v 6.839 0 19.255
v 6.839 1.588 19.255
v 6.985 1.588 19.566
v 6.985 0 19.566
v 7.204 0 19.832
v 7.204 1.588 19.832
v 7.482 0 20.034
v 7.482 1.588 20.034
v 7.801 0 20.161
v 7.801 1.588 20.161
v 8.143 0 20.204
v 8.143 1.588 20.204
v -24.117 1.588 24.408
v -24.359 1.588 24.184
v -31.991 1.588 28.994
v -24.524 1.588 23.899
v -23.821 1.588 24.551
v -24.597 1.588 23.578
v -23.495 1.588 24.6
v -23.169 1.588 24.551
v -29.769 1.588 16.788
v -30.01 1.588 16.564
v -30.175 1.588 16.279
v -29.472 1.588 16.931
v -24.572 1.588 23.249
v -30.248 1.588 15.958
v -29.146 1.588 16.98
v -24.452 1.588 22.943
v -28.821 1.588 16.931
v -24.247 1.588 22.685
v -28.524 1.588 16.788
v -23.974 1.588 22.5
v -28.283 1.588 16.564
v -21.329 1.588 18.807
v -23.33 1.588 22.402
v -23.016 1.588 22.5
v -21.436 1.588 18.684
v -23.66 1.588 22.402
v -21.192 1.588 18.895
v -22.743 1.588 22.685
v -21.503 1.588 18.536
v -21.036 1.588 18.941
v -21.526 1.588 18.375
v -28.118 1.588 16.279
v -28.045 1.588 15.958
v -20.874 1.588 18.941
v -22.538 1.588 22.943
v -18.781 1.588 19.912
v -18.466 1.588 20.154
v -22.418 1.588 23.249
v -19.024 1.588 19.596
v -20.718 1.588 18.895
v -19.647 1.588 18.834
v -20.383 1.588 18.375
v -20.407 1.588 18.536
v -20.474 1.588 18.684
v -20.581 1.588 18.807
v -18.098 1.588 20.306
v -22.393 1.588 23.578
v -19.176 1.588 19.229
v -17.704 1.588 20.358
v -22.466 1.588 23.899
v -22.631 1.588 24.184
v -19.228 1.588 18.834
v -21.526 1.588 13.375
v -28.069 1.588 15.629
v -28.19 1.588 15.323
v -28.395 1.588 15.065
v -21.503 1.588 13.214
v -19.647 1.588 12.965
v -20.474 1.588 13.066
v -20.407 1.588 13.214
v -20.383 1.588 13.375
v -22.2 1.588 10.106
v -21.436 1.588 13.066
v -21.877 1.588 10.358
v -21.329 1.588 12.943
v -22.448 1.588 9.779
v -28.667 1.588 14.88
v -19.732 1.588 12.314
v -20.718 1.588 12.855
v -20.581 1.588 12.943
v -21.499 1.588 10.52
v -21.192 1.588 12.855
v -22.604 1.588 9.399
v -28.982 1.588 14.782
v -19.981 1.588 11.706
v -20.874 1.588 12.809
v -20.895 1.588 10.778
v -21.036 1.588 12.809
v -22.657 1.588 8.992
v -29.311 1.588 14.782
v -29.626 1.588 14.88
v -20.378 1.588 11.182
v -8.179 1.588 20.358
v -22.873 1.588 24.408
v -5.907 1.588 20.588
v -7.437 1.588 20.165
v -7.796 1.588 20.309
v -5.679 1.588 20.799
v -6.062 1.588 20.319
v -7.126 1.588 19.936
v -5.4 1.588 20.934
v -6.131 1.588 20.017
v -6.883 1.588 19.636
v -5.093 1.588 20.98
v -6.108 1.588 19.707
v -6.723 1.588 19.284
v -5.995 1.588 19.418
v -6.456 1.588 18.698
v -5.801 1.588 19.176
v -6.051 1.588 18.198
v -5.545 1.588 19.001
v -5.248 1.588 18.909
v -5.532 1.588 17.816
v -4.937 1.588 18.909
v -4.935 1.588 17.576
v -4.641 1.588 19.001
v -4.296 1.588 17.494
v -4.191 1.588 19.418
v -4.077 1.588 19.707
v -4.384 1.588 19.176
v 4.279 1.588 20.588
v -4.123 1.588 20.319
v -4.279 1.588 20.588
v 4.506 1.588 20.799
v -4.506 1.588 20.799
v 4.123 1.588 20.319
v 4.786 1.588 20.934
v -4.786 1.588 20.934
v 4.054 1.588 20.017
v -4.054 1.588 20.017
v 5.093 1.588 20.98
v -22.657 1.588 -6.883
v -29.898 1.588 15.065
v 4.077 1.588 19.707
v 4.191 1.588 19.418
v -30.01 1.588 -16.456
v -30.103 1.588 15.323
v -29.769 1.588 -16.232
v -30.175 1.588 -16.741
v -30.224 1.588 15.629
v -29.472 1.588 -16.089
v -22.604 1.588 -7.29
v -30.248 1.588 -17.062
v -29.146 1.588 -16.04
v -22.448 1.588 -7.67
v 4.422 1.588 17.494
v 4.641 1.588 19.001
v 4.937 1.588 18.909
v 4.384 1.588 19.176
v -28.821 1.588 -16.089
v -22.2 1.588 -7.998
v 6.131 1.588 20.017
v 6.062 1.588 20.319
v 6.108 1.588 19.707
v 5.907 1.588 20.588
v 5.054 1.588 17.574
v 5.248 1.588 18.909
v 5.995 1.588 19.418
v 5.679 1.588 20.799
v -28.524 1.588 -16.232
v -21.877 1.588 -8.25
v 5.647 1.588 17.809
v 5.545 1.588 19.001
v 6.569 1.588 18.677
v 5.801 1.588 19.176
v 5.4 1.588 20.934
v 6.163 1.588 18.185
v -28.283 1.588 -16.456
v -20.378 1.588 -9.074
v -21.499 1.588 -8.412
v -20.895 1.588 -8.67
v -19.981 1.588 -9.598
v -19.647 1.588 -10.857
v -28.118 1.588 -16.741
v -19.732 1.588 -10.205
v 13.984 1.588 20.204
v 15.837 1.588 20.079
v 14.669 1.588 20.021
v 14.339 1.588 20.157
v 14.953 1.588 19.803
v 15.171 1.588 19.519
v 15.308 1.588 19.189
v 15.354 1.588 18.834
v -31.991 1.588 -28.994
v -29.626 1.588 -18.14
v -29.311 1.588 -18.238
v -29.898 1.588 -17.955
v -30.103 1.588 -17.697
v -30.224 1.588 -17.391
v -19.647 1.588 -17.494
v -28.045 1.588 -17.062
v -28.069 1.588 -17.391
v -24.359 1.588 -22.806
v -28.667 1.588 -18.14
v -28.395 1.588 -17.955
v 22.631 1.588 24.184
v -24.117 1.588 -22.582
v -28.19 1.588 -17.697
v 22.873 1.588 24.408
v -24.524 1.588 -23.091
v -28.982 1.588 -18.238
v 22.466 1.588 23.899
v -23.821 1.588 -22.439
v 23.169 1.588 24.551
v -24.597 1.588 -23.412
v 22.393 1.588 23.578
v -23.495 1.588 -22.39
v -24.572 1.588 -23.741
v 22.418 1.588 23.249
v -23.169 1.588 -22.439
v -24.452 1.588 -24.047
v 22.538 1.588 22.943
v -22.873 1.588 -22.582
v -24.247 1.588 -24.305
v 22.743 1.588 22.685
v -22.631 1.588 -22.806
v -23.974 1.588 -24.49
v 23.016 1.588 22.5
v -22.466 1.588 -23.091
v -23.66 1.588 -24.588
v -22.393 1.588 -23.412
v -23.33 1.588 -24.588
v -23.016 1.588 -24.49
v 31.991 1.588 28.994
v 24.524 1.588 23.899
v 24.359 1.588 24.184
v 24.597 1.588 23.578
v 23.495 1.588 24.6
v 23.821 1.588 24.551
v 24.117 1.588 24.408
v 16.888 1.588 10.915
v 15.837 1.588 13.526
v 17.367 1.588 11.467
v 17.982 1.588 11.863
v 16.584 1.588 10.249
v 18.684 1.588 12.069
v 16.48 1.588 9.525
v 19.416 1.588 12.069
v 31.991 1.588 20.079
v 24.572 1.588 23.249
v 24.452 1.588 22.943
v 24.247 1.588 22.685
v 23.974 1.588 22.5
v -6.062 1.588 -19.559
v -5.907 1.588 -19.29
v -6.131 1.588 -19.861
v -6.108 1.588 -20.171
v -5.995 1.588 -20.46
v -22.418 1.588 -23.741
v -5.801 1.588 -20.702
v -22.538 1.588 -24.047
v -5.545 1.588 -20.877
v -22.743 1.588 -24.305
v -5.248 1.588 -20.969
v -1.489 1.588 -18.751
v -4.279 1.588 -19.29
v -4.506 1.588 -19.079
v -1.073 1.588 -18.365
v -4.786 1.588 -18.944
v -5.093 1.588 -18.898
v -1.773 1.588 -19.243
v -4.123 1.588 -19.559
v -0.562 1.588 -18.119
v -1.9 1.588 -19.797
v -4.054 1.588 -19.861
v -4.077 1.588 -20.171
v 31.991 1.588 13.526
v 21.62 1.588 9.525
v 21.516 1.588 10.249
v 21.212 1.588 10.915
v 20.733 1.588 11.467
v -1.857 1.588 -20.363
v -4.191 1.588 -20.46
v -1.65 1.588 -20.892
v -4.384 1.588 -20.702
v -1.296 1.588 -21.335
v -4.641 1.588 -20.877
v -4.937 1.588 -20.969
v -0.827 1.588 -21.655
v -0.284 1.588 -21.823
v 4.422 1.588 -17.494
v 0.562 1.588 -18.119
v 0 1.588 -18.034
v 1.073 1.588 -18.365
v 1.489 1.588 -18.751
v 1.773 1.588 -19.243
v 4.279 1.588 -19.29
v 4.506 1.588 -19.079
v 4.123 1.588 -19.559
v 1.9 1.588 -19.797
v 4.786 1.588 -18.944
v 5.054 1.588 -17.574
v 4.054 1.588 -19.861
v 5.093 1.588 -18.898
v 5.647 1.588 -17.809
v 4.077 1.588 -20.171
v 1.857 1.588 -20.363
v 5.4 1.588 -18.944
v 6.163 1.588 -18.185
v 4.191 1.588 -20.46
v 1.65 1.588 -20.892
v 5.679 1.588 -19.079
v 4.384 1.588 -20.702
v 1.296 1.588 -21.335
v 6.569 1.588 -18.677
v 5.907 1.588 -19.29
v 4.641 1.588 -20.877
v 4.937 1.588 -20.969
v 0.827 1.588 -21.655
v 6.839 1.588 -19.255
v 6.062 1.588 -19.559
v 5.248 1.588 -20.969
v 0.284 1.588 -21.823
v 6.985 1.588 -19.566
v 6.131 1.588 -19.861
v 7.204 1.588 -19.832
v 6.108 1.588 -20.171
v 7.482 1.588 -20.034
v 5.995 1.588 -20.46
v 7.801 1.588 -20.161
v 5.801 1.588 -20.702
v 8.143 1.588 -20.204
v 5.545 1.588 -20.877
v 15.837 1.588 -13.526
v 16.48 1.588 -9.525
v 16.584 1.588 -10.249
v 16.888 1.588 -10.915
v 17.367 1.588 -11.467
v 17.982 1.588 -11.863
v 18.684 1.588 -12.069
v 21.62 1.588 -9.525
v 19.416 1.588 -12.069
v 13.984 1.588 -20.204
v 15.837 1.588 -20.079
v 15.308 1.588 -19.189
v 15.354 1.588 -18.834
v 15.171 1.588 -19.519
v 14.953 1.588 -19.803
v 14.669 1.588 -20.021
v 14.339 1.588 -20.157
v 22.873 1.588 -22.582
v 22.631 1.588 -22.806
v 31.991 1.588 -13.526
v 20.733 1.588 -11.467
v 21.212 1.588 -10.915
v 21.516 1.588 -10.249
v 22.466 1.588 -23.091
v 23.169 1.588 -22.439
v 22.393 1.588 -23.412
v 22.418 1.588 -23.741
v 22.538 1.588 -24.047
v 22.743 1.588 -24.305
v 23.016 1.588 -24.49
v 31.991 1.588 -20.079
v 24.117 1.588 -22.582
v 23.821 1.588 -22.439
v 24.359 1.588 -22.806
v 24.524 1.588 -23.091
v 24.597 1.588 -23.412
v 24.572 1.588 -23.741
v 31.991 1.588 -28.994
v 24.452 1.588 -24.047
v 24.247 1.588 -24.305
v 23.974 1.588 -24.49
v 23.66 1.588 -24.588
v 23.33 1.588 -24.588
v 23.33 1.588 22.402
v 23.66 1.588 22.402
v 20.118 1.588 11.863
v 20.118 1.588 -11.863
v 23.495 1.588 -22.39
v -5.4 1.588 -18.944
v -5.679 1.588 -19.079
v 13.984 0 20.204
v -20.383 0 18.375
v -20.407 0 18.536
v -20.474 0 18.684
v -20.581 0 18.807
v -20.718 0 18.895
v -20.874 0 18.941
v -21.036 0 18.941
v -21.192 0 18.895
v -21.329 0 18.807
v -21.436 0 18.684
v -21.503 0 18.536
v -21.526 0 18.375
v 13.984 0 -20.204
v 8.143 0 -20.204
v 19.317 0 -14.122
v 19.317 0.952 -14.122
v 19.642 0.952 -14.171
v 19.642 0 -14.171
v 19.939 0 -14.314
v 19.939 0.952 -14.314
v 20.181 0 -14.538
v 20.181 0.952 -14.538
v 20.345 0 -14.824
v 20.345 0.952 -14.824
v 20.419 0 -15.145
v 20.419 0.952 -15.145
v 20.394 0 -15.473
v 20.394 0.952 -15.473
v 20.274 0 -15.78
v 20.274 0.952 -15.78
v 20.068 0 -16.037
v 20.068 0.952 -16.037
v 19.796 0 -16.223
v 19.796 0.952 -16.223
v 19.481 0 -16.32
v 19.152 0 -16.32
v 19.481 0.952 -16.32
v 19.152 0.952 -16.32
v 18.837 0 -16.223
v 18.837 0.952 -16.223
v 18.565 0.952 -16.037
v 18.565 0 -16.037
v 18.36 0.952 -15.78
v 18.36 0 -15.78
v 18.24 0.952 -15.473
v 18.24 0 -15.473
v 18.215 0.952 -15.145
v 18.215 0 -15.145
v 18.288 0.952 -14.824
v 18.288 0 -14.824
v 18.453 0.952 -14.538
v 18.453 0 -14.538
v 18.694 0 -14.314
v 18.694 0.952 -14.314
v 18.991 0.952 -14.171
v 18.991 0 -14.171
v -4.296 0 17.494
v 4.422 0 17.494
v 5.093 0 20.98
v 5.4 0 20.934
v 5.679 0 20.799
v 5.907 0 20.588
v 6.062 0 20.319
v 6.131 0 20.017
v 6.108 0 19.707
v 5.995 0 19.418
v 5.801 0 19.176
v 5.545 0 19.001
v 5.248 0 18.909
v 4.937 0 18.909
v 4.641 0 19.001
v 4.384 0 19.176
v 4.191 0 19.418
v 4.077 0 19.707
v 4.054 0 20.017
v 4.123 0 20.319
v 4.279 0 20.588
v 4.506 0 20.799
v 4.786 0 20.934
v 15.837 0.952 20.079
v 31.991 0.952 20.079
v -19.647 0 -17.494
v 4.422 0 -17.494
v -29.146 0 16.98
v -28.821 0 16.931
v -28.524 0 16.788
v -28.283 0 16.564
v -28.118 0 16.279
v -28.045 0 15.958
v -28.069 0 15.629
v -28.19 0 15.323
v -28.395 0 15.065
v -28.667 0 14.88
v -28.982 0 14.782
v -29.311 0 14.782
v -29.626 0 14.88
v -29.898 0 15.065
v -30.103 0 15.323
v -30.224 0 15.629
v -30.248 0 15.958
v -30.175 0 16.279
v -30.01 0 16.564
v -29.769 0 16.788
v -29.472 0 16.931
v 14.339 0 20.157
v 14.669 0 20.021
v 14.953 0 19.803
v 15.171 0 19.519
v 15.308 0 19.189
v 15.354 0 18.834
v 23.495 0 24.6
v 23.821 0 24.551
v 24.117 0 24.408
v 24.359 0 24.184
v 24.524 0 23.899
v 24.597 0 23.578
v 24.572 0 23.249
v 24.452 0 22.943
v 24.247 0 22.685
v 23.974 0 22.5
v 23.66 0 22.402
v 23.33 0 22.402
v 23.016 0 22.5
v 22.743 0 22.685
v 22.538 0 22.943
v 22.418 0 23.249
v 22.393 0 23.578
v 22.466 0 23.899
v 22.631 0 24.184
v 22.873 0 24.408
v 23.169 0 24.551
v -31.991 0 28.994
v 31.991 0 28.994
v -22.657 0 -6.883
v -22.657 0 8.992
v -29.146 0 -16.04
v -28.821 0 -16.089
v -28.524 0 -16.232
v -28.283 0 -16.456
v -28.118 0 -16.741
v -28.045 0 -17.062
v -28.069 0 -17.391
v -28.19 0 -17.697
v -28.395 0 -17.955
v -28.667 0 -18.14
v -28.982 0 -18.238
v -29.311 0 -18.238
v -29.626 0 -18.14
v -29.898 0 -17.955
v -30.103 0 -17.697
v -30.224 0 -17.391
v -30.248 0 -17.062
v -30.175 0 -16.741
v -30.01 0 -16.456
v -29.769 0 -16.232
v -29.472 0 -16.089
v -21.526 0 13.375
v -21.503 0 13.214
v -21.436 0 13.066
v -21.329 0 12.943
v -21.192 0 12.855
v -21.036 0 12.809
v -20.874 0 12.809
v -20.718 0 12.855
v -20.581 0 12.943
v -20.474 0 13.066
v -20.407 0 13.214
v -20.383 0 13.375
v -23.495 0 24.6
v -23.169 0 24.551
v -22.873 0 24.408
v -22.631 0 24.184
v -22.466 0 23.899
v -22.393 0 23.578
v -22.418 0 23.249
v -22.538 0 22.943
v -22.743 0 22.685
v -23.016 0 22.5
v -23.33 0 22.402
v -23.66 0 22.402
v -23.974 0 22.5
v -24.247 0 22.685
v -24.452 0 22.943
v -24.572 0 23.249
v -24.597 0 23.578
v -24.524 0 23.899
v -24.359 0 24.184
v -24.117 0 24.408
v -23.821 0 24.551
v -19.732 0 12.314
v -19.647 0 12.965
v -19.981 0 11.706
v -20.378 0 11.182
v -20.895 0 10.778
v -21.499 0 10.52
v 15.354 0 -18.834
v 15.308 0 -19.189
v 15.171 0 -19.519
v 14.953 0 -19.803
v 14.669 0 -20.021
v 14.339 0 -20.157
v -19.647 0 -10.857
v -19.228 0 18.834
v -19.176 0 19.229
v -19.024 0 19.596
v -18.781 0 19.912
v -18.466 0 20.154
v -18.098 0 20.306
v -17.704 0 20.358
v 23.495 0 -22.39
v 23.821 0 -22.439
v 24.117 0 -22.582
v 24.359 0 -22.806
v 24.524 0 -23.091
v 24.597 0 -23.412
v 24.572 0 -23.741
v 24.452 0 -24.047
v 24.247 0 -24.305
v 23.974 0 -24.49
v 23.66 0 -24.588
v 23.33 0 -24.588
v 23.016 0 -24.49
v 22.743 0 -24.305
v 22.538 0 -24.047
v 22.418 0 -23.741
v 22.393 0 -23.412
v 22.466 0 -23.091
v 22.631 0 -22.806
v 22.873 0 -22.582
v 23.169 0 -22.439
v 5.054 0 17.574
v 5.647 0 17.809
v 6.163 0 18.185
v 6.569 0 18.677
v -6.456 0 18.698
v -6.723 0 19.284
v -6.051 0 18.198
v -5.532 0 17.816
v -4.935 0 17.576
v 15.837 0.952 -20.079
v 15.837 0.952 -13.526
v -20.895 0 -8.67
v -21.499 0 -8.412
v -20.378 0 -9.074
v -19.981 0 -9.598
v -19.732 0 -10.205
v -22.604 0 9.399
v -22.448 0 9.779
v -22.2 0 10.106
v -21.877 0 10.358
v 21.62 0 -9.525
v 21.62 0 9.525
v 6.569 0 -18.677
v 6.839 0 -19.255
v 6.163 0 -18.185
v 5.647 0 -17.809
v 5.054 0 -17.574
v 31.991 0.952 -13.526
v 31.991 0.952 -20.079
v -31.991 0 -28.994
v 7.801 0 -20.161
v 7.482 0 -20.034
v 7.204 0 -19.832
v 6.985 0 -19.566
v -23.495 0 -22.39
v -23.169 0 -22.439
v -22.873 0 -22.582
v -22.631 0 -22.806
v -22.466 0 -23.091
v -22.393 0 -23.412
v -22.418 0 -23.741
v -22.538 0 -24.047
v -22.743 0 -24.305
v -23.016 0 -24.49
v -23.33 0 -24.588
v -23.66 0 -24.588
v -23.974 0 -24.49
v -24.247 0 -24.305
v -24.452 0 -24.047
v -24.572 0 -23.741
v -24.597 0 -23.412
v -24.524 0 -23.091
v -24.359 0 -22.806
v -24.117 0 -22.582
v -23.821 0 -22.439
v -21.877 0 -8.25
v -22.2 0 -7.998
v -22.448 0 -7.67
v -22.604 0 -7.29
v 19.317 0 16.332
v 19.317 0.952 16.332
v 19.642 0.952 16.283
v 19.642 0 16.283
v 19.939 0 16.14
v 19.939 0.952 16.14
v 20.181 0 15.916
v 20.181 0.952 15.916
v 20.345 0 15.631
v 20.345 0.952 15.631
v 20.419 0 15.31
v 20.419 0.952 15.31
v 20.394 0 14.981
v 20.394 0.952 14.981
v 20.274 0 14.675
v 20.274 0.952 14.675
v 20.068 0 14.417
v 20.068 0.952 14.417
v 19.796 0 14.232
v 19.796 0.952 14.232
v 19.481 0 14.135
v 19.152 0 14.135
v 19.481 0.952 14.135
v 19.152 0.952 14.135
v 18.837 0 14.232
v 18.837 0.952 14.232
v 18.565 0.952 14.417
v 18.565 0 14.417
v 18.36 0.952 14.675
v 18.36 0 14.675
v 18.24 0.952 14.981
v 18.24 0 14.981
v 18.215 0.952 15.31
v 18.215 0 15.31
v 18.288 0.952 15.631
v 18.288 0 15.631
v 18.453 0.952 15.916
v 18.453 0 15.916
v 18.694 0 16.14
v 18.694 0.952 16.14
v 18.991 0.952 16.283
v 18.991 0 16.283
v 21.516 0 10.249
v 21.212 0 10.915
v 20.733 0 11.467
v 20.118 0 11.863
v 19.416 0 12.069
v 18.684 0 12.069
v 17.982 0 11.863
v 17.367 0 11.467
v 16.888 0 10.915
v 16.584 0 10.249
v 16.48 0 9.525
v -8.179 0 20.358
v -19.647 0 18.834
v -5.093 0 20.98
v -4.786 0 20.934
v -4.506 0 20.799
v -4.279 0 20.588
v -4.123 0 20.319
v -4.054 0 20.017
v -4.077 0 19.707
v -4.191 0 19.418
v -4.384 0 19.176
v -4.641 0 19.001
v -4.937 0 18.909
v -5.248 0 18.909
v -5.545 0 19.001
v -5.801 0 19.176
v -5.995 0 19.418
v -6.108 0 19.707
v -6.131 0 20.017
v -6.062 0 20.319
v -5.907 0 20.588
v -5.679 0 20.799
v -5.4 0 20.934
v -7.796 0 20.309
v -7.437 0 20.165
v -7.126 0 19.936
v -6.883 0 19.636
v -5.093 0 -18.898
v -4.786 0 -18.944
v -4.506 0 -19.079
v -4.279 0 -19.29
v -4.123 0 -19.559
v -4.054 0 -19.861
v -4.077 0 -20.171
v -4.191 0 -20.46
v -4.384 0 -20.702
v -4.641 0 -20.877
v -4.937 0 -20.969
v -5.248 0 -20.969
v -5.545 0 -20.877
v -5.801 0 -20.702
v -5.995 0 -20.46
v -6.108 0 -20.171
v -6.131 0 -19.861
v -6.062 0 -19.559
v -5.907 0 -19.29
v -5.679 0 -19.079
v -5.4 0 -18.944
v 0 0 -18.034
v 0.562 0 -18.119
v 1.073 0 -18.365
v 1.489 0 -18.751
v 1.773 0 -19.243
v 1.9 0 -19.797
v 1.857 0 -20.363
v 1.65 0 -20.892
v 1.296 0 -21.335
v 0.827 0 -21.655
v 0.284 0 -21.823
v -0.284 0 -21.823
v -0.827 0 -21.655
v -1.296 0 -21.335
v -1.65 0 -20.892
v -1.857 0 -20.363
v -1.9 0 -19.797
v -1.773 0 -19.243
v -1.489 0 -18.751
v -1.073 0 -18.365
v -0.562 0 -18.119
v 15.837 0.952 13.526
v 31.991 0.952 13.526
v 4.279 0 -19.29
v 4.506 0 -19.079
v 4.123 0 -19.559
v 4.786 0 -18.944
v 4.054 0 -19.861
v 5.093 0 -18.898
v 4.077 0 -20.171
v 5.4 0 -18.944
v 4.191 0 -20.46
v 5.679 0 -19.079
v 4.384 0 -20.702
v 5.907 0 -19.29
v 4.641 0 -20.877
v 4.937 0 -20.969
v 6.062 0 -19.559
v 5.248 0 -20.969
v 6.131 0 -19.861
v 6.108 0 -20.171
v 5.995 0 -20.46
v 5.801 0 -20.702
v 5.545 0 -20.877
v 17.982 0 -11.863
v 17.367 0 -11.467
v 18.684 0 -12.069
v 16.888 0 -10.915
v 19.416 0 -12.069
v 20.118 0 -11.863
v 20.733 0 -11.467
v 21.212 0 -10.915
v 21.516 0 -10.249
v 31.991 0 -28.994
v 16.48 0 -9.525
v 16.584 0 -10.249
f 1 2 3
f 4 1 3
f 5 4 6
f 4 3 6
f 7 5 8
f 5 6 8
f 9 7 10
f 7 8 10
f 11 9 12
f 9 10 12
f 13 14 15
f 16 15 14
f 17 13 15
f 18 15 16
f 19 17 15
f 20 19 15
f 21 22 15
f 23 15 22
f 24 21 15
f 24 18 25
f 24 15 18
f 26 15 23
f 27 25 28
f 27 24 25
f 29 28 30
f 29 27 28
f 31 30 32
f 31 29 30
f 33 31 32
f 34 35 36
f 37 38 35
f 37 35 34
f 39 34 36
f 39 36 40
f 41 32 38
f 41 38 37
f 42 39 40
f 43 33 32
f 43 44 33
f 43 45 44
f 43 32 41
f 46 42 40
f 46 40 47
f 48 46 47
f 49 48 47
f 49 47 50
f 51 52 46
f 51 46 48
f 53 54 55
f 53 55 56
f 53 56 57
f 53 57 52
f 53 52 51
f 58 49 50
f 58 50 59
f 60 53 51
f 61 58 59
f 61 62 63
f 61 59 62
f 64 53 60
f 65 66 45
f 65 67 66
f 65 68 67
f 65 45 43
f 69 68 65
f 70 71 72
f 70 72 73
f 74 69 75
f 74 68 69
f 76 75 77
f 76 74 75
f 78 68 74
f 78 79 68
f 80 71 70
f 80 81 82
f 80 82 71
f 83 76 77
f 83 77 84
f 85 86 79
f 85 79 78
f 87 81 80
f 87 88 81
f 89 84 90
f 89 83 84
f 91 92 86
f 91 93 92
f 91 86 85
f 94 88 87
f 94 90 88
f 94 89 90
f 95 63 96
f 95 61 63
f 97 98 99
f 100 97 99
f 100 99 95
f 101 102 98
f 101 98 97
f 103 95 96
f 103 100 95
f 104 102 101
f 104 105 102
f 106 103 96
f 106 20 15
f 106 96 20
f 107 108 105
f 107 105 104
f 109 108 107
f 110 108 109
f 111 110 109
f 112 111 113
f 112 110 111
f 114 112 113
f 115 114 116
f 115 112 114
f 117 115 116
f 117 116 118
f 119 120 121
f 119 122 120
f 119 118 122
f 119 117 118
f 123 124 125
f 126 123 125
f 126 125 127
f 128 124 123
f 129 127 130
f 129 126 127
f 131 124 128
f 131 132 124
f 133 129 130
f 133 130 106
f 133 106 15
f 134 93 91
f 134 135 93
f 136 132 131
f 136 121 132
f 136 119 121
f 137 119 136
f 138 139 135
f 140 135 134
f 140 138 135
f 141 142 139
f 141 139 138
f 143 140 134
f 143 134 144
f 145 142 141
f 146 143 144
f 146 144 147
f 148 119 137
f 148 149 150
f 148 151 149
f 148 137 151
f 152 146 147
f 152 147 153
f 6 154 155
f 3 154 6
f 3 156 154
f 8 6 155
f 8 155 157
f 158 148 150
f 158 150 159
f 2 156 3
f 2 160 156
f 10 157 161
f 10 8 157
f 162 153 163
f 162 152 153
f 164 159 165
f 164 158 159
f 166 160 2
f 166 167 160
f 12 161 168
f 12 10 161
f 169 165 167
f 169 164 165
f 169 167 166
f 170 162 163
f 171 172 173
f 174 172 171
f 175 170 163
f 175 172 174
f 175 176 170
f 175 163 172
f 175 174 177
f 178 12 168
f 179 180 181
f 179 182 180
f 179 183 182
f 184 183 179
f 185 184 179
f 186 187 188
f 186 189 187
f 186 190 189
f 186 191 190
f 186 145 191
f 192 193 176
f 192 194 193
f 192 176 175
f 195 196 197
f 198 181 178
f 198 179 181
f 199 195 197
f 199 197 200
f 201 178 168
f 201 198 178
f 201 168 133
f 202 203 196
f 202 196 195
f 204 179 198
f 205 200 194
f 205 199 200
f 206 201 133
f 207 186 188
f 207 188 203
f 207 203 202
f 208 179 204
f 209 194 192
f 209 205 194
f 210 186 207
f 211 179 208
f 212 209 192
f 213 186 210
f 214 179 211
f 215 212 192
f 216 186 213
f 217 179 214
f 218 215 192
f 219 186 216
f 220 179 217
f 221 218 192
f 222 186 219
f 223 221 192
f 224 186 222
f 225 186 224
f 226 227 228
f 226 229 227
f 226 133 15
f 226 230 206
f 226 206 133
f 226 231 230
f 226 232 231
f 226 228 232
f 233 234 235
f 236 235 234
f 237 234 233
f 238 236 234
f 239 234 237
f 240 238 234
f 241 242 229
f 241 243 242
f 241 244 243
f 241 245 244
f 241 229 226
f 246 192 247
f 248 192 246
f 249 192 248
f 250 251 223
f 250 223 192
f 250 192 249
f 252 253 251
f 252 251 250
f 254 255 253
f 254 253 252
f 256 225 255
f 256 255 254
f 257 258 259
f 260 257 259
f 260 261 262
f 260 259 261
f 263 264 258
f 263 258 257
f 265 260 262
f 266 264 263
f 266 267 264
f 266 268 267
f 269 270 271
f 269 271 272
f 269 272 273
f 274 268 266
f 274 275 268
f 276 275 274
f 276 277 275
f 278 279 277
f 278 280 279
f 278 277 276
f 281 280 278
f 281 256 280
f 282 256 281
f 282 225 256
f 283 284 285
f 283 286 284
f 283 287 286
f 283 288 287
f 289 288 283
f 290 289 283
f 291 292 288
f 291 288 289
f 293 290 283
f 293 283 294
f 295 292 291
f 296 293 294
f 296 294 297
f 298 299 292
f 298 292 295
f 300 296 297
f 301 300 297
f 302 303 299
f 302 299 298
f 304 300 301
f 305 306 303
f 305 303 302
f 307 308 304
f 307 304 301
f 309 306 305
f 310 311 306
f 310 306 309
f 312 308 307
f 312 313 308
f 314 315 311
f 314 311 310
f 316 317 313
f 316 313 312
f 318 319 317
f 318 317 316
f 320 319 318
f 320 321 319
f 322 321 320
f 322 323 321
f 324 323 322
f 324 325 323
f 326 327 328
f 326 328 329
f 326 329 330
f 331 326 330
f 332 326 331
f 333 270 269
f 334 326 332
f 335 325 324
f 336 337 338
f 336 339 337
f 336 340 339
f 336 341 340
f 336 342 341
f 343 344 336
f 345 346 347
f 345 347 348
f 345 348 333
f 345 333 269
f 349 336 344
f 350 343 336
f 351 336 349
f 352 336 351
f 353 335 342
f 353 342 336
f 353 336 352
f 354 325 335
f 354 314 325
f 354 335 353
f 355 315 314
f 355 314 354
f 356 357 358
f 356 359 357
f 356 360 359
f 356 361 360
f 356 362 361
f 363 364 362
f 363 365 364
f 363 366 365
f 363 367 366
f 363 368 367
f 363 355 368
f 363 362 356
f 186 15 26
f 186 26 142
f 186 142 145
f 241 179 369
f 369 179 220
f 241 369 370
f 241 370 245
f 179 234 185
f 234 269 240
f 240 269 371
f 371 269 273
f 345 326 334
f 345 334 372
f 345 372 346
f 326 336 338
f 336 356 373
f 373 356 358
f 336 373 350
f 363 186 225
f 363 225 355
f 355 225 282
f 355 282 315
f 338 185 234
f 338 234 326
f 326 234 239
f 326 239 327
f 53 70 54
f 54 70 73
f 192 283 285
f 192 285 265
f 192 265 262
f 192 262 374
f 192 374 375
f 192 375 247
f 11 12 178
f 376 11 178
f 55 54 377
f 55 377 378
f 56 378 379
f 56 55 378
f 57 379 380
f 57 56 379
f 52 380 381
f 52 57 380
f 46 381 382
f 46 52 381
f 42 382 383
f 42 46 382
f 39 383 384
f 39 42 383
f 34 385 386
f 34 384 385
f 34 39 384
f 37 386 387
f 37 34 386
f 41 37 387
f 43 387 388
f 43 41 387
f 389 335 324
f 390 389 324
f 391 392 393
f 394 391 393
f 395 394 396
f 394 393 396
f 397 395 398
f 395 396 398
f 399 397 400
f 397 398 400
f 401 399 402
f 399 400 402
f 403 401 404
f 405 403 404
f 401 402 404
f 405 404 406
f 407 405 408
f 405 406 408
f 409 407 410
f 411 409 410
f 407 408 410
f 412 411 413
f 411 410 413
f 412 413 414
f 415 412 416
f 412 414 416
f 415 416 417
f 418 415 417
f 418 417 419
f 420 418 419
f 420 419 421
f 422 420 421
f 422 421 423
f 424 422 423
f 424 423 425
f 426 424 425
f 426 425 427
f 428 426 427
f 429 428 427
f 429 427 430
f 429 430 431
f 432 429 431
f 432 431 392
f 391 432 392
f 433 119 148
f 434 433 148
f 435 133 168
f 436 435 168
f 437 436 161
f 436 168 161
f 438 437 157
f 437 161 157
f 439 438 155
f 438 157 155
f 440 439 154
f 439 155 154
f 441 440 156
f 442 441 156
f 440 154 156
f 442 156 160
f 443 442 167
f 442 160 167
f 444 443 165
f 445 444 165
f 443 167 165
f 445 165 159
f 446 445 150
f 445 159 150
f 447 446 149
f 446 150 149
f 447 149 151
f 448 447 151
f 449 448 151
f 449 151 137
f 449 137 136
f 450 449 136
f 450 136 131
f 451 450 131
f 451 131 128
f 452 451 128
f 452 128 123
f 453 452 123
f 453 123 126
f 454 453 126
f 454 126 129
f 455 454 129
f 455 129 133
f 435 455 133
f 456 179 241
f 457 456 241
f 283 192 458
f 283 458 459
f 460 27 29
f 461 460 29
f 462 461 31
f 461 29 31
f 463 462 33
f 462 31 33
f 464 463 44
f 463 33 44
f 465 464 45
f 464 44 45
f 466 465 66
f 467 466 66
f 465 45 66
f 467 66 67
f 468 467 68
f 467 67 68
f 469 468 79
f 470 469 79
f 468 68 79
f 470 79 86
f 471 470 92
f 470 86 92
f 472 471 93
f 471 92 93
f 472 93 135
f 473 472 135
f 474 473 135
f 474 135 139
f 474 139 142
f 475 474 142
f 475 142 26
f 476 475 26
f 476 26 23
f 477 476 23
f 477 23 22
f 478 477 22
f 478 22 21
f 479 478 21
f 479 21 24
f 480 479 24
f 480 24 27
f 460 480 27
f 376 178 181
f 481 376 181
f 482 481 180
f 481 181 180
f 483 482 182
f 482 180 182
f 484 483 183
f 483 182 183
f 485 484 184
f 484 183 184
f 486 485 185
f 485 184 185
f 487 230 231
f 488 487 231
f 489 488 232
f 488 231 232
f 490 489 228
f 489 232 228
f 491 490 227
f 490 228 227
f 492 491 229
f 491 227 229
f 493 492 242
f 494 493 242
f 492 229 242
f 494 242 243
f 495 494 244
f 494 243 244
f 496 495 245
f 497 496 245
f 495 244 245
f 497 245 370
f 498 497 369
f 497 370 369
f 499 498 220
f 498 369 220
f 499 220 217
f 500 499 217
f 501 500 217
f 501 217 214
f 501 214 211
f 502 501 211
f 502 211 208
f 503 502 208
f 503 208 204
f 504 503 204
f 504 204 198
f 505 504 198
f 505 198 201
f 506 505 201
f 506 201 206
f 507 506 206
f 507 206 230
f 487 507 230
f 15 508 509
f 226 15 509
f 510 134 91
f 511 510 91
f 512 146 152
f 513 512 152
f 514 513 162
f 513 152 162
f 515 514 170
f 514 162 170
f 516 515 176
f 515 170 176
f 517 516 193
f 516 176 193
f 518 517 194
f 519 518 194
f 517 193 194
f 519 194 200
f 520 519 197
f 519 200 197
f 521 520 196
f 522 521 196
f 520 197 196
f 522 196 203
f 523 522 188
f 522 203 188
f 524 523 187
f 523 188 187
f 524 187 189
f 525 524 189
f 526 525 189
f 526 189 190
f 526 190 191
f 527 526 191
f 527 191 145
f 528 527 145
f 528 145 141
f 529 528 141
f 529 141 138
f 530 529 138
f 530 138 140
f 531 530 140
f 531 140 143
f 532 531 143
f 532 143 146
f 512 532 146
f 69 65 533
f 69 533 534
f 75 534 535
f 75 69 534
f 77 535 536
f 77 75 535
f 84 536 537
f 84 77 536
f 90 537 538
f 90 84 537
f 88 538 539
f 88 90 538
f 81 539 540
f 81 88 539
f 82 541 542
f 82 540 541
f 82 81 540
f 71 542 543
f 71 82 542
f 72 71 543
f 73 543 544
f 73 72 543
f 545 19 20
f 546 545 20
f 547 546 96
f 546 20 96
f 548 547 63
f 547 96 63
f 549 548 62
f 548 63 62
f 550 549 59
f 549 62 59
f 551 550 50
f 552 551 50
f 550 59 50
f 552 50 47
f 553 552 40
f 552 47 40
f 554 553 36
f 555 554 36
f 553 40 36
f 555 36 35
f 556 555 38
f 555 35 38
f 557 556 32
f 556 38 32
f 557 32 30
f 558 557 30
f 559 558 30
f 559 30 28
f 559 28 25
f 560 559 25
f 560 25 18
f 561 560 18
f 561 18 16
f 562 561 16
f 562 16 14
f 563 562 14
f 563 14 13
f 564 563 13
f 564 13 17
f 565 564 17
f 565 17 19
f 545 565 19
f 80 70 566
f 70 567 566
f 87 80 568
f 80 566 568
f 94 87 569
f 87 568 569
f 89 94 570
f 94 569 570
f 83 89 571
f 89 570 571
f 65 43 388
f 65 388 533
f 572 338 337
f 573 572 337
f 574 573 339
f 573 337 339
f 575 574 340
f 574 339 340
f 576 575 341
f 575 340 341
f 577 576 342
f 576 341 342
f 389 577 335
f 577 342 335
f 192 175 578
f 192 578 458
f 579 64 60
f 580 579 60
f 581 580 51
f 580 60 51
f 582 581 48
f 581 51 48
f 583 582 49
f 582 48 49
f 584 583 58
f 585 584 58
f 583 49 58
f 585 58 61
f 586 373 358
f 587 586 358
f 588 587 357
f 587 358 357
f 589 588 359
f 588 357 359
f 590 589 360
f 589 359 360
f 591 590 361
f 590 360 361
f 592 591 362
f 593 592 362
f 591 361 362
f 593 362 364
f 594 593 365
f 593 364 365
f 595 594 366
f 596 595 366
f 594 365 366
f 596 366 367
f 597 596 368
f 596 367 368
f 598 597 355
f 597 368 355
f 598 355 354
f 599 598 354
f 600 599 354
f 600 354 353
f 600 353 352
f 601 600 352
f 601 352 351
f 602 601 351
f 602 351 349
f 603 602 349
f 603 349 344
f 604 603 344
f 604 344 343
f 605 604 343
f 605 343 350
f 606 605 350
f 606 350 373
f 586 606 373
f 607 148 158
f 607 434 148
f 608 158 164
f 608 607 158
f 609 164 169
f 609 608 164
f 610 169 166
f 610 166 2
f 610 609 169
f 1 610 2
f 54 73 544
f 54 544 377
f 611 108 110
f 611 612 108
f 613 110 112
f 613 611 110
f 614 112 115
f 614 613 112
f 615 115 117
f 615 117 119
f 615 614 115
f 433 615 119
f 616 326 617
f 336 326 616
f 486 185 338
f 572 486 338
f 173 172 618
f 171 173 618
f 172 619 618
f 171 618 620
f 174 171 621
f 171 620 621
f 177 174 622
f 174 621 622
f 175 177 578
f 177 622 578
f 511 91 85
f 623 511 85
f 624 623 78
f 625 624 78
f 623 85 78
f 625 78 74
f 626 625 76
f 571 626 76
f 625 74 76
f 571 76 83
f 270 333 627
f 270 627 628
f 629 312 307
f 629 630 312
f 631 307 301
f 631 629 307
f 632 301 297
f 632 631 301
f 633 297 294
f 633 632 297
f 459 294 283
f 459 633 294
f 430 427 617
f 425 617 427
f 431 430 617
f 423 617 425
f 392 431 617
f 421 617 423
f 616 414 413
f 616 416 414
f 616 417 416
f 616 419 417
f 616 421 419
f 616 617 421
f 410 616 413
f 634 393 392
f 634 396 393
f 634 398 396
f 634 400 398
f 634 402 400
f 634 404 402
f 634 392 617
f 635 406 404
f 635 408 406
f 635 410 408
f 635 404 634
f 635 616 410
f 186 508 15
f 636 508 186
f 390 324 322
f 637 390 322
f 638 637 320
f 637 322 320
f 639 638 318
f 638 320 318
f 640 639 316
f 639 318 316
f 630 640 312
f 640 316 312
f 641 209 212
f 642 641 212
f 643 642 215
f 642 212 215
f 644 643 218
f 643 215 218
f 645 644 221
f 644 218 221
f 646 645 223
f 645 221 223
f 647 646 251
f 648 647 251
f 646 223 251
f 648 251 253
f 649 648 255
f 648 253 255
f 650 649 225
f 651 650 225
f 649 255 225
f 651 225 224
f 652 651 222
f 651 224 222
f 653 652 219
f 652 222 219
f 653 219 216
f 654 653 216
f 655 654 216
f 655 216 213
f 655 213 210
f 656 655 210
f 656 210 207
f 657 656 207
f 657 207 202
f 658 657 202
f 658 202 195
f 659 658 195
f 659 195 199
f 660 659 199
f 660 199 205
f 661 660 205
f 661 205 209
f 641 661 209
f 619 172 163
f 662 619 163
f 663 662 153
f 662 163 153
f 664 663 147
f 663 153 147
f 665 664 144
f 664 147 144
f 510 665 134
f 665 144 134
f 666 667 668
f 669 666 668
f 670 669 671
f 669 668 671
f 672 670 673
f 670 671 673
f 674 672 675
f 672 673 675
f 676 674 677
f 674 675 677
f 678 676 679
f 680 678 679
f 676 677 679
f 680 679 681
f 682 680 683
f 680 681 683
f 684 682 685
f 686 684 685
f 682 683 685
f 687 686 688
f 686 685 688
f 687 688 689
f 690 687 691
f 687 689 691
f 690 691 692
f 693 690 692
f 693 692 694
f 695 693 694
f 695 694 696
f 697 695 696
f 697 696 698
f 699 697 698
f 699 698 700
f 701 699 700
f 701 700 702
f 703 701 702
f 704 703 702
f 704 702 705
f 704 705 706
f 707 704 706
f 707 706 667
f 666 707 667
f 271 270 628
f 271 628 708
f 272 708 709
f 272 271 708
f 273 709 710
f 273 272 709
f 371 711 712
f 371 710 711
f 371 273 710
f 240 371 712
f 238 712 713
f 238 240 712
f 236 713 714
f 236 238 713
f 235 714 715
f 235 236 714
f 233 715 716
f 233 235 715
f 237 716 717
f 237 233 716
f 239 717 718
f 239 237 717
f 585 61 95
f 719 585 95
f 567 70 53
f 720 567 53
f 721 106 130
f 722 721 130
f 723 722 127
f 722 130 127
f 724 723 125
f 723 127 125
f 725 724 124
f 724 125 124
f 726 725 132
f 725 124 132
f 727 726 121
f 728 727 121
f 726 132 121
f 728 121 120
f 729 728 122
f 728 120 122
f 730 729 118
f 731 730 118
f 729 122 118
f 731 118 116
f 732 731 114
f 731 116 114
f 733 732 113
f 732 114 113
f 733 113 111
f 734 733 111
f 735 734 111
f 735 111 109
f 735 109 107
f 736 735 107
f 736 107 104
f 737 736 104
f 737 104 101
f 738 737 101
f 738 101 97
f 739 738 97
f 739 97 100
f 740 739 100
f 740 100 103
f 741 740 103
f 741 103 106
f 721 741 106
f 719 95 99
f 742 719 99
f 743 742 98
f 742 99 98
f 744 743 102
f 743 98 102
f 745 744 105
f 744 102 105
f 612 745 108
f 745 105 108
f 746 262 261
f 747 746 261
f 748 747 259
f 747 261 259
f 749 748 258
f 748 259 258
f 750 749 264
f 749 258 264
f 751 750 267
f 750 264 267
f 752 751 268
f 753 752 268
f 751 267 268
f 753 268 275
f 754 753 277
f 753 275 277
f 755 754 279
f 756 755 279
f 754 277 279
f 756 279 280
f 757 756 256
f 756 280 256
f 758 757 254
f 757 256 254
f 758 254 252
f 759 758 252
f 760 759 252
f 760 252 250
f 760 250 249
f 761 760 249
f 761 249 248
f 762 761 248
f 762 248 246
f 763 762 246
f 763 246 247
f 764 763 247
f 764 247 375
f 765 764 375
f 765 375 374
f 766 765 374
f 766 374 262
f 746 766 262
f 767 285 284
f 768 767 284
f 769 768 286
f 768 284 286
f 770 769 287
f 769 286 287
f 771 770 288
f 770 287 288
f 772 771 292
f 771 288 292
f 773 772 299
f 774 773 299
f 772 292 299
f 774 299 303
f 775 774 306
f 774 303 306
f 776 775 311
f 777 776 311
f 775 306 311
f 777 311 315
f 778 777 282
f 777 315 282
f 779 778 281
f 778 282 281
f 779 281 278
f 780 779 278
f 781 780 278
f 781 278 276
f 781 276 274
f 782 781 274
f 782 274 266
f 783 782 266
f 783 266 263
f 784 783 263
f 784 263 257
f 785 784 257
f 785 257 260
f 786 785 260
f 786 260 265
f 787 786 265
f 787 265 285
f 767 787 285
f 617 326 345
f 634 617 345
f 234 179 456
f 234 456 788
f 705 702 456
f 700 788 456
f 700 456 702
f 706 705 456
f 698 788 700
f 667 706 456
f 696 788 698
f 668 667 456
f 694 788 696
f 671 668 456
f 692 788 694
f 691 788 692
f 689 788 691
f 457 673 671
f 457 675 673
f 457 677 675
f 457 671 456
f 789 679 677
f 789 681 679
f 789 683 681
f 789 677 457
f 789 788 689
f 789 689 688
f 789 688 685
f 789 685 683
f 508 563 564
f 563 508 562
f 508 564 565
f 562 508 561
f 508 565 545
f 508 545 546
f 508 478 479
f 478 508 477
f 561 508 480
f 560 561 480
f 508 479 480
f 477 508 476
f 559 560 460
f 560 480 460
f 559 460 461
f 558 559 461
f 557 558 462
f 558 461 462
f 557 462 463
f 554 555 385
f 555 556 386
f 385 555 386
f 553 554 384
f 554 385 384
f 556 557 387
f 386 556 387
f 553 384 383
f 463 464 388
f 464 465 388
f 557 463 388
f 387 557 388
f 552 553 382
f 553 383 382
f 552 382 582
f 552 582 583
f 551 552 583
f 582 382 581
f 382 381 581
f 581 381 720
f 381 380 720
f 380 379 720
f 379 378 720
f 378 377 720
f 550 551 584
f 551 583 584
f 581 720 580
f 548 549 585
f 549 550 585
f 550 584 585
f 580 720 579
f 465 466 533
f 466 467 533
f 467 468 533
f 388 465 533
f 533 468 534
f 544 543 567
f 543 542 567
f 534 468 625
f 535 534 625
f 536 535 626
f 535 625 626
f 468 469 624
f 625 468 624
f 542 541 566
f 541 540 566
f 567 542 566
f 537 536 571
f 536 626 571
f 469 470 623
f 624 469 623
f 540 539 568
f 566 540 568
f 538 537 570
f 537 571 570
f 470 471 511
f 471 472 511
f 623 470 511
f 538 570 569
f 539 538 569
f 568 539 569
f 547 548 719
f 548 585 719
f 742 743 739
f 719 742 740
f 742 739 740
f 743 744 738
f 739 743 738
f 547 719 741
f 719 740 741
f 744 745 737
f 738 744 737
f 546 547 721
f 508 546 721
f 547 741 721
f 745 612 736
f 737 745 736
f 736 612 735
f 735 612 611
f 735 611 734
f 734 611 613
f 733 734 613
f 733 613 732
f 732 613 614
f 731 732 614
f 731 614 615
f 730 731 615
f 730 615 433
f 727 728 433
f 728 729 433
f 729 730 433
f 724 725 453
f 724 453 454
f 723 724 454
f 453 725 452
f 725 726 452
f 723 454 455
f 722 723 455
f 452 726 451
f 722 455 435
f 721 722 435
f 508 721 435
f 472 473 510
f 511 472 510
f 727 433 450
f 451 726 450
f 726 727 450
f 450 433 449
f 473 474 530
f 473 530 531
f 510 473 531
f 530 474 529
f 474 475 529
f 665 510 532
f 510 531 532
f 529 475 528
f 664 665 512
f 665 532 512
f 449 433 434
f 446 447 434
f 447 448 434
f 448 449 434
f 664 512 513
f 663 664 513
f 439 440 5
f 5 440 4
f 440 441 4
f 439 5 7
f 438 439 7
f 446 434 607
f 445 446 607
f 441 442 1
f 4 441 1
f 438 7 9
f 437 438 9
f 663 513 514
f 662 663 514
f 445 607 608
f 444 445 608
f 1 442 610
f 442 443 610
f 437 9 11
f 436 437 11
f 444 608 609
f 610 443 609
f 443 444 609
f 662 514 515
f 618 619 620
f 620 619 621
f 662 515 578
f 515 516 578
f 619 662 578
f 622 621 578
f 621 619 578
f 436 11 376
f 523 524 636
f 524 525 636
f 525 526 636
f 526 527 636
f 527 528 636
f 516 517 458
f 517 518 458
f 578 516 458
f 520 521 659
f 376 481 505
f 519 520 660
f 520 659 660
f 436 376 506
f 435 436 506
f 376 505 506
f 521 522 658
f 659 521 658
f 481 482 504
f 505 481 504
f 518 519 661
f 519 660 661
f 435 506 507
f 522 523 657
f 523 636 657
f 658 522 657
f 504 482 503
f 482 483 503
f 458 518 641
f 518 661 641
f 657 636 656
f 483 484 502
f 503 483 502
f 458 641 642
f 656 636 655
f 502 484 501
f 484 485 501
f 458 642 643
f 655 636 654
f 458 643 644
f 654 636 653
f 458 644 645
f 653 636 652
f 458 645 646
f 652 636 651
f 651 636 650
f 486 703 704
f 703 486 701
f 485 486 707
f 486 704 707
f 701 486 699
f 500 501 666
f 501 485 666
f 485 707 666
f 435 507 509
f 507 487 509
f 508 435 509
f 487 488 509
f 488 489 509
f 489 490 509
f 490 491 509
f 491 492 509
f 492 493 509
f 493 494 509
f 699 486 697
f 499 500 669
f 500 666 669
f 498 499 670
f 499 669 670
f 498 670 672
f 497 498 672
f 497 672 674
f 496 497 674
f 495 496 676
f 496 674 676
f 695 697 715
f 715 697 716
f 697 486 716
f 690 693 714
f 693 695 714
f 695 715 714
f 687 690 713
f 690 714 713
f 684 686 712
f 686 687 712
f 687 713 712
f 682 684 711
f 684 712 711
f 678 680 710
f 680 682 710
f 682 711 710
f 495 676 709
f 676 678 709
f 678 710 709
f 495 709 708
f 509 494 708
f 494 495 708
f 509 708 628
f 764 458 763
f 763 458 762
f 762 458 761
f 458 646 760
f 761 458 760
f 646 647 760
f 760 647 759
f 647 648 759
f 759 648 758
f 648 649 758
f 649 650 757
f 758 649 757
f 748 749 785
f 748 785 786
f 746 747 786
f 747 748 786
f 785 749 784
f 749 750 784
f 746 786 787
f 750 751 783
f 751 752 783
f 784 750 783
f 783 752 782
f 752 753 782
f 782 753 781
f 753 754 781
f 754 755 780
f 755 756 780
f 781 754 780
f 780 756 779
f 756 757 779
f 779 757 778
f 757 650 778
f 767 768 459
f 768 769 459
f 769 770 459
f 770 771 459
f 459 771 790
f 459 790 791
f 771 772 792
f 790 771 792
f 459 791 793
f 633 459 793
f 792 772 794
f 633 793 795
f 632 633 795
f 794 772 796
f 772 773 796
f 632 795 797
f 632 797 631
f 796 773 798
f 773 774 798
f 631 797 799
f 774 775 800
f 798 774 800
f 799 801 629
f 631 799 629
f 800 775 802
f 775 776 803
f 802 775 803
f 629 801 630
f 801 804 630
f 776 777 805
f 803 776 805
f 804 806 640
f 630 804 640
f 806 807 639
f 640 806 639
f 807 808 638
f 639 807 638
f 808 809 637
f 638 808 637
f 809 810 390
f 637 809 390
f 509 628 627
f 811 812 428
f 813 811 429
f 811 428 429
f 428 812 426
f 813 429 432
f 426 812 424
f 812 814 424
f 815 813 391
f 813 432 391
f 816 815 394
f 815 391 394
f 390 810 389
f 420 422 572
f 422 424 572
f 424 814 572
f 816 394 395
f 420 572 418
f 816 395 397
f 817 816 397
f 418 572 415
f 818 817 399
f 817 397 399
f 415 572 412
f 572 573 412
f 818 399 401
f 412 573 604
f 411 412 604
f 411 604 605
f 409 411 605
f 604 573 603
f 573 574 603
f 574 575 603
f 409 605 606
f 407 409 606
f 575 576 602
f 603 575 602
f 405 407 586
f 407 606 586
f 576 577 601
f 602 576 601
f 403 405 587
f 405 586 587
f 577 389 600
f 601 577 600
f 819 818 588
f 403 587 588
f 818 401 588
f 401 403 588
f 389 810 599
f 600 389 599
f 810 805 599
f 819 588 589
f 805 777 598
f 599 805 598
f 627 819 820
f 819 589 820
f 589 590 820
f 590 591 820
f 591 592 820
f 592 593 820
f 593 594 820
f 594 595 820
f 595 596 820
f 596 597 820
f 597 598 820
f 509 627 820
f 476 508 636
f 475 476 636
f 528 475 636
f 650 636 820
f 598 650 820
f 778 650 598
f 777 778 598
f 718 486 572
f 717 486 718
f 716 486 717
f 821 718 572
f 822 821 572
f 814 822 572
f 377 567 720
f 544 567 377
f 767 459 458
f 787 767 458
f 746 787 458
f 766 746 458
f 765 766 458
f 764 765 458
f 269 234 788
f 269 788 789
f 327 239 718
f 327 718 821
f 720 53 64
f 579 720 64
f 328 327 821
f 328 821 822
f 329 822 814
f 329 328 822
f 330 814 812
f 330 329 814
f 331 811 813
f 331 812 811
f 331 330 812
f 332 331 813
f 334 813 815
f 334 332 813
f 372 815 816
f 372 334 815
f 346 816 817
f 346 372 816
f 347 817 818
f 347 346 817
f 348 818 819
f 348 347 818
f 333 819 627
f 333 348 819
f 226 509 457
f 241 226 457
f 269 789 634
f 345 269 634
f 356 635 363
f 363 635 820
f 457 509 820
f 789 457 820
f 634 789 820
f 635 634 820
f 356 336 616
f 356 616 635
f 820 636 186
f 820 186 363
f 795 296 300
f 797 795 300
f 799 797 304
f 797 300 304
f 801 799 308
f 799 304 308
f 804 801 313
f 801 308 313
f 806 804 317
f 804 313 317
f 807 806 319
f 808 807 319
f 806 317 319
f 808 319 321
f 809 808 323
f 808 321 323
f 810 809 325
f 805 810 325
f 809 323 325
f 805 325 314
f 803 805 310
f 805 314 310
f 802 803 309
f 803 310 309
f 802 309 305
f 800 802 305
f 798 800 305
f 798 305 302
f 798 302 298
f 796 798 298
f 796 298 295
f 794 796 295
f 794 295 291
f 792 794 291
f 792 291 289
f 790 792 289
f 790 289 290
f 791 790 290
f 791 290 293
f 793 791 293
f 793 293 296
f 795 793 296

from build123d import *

# Parameters (mm, degrees)
SKETCH1_W           = 63.9826
SKETCH1_H           = 57.9882
BOSS_EXTRUDE1_DEPTH = 1.5875
SKETCH2_R           = 0.513965226
SKETCH2_R_2         = 1.1049
SKETCH2_R_3         = 1.0414
CUT_EXTRUDE1_DEPTH  = 7.62
SKETCH3_R           = 1.905
CUT_EXTRUDE2_DEPTH  = 44.204412584
SKETCH4_W           = 17.78
SKETCH4_H           = 6.5532
CUT_EXTRUDE3_DEPTH  = 0.635
SKETCH5_W           = 35.0012
SKETCH5_H           = 34.9885
CUT_EXTRUDE4_DEPTH  = 44.204412584
CUT_EXTRUDE5_DEPTH  = 44.204412584
SKETCH7_R           = 1.1049
CUT_EXTRUDE6_DEPTH  = 44.204412584
FILLET1_R           = 2.54
FILLET2_R           = 2.54
FILLET5_R           = 2.54
FILLET6_R           = 2.54
SKETCH8_R           = 1.1049
CUT_EXTRUDE7_DEPTH  = 2.54


with BuildPart() as part:
    # Sketch1 → Boss-Extrude1 (new body)
    with BuildSketch(Plane(origin=(0, 0, 0), x_dir=(1, 0, 0), z_dir=(0, 1, 0))):
        Rectangle(SKETCH1_W, SKETCH1_H)
    extrude(amount=BOSS_EXTRUDE1_DEPTH)

    # Sketch2 → Cut-Extrude1 (cut)
    with BuildSketch(Plane(origin=(0, 1.5875, 0), x_dir=(1, 0, 0), z_dir=(0, 1, 0))):
        with Locations(Location((0, 0, 0), (0, 0, 270))):
            Circle(SKETCH2_R)
        with Locations(Location((-23.495, -23.495, 0), (0, 0, 270))):
            Circle(SKETCH2_R_2)
        with Locations(Location((23.495, -23.495, 0), (0, 0, 270))):
            Circle(SKETCH2_R_2)
        with Locations(Location((-23.495, 23.495, 0), (0, 0, 270))):
            Circle(SKETCH2_R_2)
        with Locations(Location((23.495, 23.495, 0), (0, 0, 270))):
            Circle(SKETCH2_R_2)
        with Locations(Location((-5.0927, 19.939, 0), (0, 0, 270))):
            Circle(SKETCH2_R_3)
        with Locations(Location((5.0927, 19.939, 0), (0, 0, 270))):
            Circle(SKETCH2_R_3)
        with Locations(Location((5.0927, -19.939, 0), (0, 0, 270))):
            Circle(SKETCH2_R_3)
        with Locations(Location((-5.0927, -19.939, 0), (0, 0, 270))):
            Circle(SKETCH2_R_3)
    extrude(amount=-CUT_EXTRUDE1_DEPTH, mode=Mode.SUBTRACT)

    # Sketch3 → Cut-Extrude2 (cut, through all)
    with BuildSketch(Plane(origin=(0, 1.5875, 0), x_dir=(1, 0, 0), z_dir=(0, 1, 0))):
        with Locations(Location((0, 19.939, 0), (0, 0, 270))):
            Circle(SKETCH3_R)
        with BuildLine():
            Line((16.47985425, -9.525), (16.47985425, 9.525))
            ThreePointArc((16.47985425, 9.525), (19.05, 12.09514575), (21.62014575, 9.525))
            Line((21.62014575, 9.525), (21.62014575, -9.525))
            ThreePointArc((21.62014575, -9.525), (19.05, -12.09514575), (16.47985425, -9.525))
        make_face()
        with BuildLine():
            Line((-20.3835, -13.375), (-20.3835, -18.375))
            ThreePointArc((-20.3835, -18.375), (-20.955, -18.9465), (-21.5265, -18.375))
            Line((-21.5265, -18.375), (-21.5265, -13.375))
            ThreePointArc((-21.5265, -13.375), (-20.955, -12.8035), (-20.3835, -13.375))
        make_face()
    extrude(amount=-CUT_EXTRUDE2_DEPTH, mode=Mode.SUBTRACT)

    # Sketch4 → Cut-Extrude3 (cut)
    with BuildSketch(Plane(origin=(0, 1.5875, 0), x_dir=(1, 0, 0), z_dir=(0, 1, 0))):
        with Locations((24.7269, -16.8021)):
            Rectangle(SKETCH4_W, SKETCH4_H)
        with Locations((24.7269, 16.8021)):
            Rectangle(SKETCH4_W, SKETCH4_H)
    extrude(amount=-CUT_EXTRUDE3_DEPTH, mode=Mode.SUBTRACT)

    # Sketch5 → Cut-Extrude4 (cut, through all)
    with BuildSketch(Plane(origin=(0, 1.5875, 0), x_dir=(1, 0, 0), z_dir=(0, 1, 0))):
        with Locations((-2.1463, 0)):
            Rectangle(SKETCH5_W, SKETCH5_H)
    extrude(amount=-CUT_EXTRUDE4_DEPTH, mode=Mode.SUBTRACT)

    # Sketch6 → Cut-Extrude5 (cut, through all)
    with BuildSketch(Plane(origin=(0, 1.5875, 0), x_dir=(1, 0, 0), z_dir=(0, 1, 0))):
        with BuildLine():
            Line((-7.452592056, -17.49425), (-18.430007944, -17.49425))
            ThreePointArc((-18.430007944, -17.49425), (-19.013249676, -18.054409326), (-19.2278, -18.8341))
            ThreePointArc((-19.2278, -18.8341), (-18.781430735, -19.911730735), (-17.7038, -20.3581))
            Line((-17.7038, -20.3581), (-8.1788, -20.3581))
            ThreePointArc((-8.1788, -20.3581), (-6.701554692, -19.208696183), (-7.452592056, -17.49425))
        make_face()
        with BuildLine():
            Line((-18.430007944, -17.49425), (-19.6469, -17.49425))
            Line((-19.6469, -17.49425), (-19.6469, -18.8341))
            Line((-19.6469, -18.8341), (-19.2278, -18.8341))
            ThreePointArc((-19.2278, -18.8341), (-19.013249676, -18.054409326), (-18.430007944, -17.49425))
        make_face()
        with BuildLine():
            Line((-22.6568, 6.8834), (-22.6568, -8.9916))
            ThreePointArc((-22.6568, -8.9916), (-21.431305697, -10.537274003), (-19.6469, -9.696535806))
            Line((-19.6469, -9.696535806), (-19.6469, 7.588335806))
            ThreePointArc((-19.6469, 7.588335806), (-21.431305697, 8.429074003), (-22.6568, 6.8834))
        make_face()
        with BuildLine():
            Line((14.269902317, -17.49425), (7.857194183, -17.49425))
            ThreePointArc((7.857194183, -17.49425), (6.780339401, -18.977660877), (8.142735041, -20.20403854))
            Line((8.142735041, -20.20403854), (13.98436146, -20.20403854))
            ThreePointArc((13.98436146, -20.20403854), (14.953054291, -19.802792832), (15.3543, -18.8341))
            ThreePointArc((15.3543, -18.8341), (15.049233525, -17.972253674), (14.269902317, -17.49425))
        make_face()
        with BuildLine():
            Line((14.904303176, -17.49425), (14.269902317, -17.49425))
            ThreePointArc((14.269902317, -17.49425), (15.049233525, -17.972253674), (15.3543, -18.8341))
            Line((15.3543, -18.8341), (15.3543, -17.49425))
            Line((15.3543, -17.49425), (14.904303176, -17.49425))
        make_face()
        with BuildLine():
            ThreePointArc((8.142735041, 20.20403854), (6.780339401, 18.977660877), (7.857194183, 17.49425))
            Line((7.857194183, 17.49425), (14.269902317, 17.49425))
            ThreePointArc((14.269902317, 17.49425), (15.049233525, 17.972253674), (15.3543, 18.8341))
            ThreePointArc((15.3543, 18.8341), (14.953054291, 19.802792832), (13.98436146, 20.20403854))
            Line((13.98436146, 20.20403854), (8.142735041, 20.20403854))
        make_face()
        with BuildLine():
            ThreePointArc((15.3543, 18.8341), (15.049233525, 17.972253674), (14.269902317, 17.49425))
            Line((14.269902317, 17.49425), (14.904303176, 17.49425))
            Line((14.904303176, 17.49425), (15.3543, 17.49425))
            Line((15.3543, 17.49425), (15.3543, 18.8341))
        make_face()
    extrude(amount=-CUT_EXTRUDE5_DEPTH, mode=Mode.SUBTRACT)

    # Sketch7 → Cut-Extrude6 (cut, through all)
    with BuildSketch(Plane(origin=(0, 1.5875, 0), x_dir=(1, 0, 0), z_dir=(0, 1, 0))):
        with Locations(Location((-29.1465, -15.875, 0), (0, 0, 270))):
            Circle(SKETCH7_R)
        with Locations(Location((-29.1465, 17.145, 0), (0, 0, 270))):
            Circle(SKETCH7_R)
    extrude(amount=-CUT_EXTRUDE6_DEPTH, mode=Mode.SUBTRACT)

    # Fillet1
    fillet1_edges = [part.edges().sort_by_distance(p)[0] for p in [
        (-19.6469, 0.79375, -7.588335806),
        (-19.6469, 0.79375, 9.696535806),
    ]]
    fillet(fillet1_edges, radius=FILLET1_R)

    # Fillet2
    fillet2_edges = [part.edges().sort_by_distance(p)[0] for p in [
        (-7.452592056, 0.79375, 17.49425),
    ]]
    fillet(fillet2_edges, radius=FILLET2_R)

    # Fillet5
    fillet5_edges = [part.edges().sort_by_distance(p)[0] for p in [
        (7.857194183, 0.79375, 17.49425),
    ]]
    fillet(fillet5_edges, radius=FILLET5_R)

    # Fillet6
    fillet6_edges = [part.edges().sort_by_distance(p)[0] for p in [
        (7.857194183, 0.79375, -17.49425),
    ]]
    fillet(fillet6_edges, radius=FILLET6_R)

    # Sketch8 → Cut-Extrude7 (cut)
    with BuildSketch(Plane(origin=(0, 0.9525, 0), x_dir=(1, 0, 0), z_dir=(0, 1, 0))):
        with Locations(Location((19.3167, 15.2273, 0), (0, 0, 270))):
            Circle(SKETCH8_R)
        with Locations(Location((19.3167, -15.2273, 0), (0, 0, 270))):
            Circle(SKETCH8_R)
    extrude(amount=-CUT_EXTRUDE7_DEPTH, mode=Mode.SUBTRACT)


solid = part.part
